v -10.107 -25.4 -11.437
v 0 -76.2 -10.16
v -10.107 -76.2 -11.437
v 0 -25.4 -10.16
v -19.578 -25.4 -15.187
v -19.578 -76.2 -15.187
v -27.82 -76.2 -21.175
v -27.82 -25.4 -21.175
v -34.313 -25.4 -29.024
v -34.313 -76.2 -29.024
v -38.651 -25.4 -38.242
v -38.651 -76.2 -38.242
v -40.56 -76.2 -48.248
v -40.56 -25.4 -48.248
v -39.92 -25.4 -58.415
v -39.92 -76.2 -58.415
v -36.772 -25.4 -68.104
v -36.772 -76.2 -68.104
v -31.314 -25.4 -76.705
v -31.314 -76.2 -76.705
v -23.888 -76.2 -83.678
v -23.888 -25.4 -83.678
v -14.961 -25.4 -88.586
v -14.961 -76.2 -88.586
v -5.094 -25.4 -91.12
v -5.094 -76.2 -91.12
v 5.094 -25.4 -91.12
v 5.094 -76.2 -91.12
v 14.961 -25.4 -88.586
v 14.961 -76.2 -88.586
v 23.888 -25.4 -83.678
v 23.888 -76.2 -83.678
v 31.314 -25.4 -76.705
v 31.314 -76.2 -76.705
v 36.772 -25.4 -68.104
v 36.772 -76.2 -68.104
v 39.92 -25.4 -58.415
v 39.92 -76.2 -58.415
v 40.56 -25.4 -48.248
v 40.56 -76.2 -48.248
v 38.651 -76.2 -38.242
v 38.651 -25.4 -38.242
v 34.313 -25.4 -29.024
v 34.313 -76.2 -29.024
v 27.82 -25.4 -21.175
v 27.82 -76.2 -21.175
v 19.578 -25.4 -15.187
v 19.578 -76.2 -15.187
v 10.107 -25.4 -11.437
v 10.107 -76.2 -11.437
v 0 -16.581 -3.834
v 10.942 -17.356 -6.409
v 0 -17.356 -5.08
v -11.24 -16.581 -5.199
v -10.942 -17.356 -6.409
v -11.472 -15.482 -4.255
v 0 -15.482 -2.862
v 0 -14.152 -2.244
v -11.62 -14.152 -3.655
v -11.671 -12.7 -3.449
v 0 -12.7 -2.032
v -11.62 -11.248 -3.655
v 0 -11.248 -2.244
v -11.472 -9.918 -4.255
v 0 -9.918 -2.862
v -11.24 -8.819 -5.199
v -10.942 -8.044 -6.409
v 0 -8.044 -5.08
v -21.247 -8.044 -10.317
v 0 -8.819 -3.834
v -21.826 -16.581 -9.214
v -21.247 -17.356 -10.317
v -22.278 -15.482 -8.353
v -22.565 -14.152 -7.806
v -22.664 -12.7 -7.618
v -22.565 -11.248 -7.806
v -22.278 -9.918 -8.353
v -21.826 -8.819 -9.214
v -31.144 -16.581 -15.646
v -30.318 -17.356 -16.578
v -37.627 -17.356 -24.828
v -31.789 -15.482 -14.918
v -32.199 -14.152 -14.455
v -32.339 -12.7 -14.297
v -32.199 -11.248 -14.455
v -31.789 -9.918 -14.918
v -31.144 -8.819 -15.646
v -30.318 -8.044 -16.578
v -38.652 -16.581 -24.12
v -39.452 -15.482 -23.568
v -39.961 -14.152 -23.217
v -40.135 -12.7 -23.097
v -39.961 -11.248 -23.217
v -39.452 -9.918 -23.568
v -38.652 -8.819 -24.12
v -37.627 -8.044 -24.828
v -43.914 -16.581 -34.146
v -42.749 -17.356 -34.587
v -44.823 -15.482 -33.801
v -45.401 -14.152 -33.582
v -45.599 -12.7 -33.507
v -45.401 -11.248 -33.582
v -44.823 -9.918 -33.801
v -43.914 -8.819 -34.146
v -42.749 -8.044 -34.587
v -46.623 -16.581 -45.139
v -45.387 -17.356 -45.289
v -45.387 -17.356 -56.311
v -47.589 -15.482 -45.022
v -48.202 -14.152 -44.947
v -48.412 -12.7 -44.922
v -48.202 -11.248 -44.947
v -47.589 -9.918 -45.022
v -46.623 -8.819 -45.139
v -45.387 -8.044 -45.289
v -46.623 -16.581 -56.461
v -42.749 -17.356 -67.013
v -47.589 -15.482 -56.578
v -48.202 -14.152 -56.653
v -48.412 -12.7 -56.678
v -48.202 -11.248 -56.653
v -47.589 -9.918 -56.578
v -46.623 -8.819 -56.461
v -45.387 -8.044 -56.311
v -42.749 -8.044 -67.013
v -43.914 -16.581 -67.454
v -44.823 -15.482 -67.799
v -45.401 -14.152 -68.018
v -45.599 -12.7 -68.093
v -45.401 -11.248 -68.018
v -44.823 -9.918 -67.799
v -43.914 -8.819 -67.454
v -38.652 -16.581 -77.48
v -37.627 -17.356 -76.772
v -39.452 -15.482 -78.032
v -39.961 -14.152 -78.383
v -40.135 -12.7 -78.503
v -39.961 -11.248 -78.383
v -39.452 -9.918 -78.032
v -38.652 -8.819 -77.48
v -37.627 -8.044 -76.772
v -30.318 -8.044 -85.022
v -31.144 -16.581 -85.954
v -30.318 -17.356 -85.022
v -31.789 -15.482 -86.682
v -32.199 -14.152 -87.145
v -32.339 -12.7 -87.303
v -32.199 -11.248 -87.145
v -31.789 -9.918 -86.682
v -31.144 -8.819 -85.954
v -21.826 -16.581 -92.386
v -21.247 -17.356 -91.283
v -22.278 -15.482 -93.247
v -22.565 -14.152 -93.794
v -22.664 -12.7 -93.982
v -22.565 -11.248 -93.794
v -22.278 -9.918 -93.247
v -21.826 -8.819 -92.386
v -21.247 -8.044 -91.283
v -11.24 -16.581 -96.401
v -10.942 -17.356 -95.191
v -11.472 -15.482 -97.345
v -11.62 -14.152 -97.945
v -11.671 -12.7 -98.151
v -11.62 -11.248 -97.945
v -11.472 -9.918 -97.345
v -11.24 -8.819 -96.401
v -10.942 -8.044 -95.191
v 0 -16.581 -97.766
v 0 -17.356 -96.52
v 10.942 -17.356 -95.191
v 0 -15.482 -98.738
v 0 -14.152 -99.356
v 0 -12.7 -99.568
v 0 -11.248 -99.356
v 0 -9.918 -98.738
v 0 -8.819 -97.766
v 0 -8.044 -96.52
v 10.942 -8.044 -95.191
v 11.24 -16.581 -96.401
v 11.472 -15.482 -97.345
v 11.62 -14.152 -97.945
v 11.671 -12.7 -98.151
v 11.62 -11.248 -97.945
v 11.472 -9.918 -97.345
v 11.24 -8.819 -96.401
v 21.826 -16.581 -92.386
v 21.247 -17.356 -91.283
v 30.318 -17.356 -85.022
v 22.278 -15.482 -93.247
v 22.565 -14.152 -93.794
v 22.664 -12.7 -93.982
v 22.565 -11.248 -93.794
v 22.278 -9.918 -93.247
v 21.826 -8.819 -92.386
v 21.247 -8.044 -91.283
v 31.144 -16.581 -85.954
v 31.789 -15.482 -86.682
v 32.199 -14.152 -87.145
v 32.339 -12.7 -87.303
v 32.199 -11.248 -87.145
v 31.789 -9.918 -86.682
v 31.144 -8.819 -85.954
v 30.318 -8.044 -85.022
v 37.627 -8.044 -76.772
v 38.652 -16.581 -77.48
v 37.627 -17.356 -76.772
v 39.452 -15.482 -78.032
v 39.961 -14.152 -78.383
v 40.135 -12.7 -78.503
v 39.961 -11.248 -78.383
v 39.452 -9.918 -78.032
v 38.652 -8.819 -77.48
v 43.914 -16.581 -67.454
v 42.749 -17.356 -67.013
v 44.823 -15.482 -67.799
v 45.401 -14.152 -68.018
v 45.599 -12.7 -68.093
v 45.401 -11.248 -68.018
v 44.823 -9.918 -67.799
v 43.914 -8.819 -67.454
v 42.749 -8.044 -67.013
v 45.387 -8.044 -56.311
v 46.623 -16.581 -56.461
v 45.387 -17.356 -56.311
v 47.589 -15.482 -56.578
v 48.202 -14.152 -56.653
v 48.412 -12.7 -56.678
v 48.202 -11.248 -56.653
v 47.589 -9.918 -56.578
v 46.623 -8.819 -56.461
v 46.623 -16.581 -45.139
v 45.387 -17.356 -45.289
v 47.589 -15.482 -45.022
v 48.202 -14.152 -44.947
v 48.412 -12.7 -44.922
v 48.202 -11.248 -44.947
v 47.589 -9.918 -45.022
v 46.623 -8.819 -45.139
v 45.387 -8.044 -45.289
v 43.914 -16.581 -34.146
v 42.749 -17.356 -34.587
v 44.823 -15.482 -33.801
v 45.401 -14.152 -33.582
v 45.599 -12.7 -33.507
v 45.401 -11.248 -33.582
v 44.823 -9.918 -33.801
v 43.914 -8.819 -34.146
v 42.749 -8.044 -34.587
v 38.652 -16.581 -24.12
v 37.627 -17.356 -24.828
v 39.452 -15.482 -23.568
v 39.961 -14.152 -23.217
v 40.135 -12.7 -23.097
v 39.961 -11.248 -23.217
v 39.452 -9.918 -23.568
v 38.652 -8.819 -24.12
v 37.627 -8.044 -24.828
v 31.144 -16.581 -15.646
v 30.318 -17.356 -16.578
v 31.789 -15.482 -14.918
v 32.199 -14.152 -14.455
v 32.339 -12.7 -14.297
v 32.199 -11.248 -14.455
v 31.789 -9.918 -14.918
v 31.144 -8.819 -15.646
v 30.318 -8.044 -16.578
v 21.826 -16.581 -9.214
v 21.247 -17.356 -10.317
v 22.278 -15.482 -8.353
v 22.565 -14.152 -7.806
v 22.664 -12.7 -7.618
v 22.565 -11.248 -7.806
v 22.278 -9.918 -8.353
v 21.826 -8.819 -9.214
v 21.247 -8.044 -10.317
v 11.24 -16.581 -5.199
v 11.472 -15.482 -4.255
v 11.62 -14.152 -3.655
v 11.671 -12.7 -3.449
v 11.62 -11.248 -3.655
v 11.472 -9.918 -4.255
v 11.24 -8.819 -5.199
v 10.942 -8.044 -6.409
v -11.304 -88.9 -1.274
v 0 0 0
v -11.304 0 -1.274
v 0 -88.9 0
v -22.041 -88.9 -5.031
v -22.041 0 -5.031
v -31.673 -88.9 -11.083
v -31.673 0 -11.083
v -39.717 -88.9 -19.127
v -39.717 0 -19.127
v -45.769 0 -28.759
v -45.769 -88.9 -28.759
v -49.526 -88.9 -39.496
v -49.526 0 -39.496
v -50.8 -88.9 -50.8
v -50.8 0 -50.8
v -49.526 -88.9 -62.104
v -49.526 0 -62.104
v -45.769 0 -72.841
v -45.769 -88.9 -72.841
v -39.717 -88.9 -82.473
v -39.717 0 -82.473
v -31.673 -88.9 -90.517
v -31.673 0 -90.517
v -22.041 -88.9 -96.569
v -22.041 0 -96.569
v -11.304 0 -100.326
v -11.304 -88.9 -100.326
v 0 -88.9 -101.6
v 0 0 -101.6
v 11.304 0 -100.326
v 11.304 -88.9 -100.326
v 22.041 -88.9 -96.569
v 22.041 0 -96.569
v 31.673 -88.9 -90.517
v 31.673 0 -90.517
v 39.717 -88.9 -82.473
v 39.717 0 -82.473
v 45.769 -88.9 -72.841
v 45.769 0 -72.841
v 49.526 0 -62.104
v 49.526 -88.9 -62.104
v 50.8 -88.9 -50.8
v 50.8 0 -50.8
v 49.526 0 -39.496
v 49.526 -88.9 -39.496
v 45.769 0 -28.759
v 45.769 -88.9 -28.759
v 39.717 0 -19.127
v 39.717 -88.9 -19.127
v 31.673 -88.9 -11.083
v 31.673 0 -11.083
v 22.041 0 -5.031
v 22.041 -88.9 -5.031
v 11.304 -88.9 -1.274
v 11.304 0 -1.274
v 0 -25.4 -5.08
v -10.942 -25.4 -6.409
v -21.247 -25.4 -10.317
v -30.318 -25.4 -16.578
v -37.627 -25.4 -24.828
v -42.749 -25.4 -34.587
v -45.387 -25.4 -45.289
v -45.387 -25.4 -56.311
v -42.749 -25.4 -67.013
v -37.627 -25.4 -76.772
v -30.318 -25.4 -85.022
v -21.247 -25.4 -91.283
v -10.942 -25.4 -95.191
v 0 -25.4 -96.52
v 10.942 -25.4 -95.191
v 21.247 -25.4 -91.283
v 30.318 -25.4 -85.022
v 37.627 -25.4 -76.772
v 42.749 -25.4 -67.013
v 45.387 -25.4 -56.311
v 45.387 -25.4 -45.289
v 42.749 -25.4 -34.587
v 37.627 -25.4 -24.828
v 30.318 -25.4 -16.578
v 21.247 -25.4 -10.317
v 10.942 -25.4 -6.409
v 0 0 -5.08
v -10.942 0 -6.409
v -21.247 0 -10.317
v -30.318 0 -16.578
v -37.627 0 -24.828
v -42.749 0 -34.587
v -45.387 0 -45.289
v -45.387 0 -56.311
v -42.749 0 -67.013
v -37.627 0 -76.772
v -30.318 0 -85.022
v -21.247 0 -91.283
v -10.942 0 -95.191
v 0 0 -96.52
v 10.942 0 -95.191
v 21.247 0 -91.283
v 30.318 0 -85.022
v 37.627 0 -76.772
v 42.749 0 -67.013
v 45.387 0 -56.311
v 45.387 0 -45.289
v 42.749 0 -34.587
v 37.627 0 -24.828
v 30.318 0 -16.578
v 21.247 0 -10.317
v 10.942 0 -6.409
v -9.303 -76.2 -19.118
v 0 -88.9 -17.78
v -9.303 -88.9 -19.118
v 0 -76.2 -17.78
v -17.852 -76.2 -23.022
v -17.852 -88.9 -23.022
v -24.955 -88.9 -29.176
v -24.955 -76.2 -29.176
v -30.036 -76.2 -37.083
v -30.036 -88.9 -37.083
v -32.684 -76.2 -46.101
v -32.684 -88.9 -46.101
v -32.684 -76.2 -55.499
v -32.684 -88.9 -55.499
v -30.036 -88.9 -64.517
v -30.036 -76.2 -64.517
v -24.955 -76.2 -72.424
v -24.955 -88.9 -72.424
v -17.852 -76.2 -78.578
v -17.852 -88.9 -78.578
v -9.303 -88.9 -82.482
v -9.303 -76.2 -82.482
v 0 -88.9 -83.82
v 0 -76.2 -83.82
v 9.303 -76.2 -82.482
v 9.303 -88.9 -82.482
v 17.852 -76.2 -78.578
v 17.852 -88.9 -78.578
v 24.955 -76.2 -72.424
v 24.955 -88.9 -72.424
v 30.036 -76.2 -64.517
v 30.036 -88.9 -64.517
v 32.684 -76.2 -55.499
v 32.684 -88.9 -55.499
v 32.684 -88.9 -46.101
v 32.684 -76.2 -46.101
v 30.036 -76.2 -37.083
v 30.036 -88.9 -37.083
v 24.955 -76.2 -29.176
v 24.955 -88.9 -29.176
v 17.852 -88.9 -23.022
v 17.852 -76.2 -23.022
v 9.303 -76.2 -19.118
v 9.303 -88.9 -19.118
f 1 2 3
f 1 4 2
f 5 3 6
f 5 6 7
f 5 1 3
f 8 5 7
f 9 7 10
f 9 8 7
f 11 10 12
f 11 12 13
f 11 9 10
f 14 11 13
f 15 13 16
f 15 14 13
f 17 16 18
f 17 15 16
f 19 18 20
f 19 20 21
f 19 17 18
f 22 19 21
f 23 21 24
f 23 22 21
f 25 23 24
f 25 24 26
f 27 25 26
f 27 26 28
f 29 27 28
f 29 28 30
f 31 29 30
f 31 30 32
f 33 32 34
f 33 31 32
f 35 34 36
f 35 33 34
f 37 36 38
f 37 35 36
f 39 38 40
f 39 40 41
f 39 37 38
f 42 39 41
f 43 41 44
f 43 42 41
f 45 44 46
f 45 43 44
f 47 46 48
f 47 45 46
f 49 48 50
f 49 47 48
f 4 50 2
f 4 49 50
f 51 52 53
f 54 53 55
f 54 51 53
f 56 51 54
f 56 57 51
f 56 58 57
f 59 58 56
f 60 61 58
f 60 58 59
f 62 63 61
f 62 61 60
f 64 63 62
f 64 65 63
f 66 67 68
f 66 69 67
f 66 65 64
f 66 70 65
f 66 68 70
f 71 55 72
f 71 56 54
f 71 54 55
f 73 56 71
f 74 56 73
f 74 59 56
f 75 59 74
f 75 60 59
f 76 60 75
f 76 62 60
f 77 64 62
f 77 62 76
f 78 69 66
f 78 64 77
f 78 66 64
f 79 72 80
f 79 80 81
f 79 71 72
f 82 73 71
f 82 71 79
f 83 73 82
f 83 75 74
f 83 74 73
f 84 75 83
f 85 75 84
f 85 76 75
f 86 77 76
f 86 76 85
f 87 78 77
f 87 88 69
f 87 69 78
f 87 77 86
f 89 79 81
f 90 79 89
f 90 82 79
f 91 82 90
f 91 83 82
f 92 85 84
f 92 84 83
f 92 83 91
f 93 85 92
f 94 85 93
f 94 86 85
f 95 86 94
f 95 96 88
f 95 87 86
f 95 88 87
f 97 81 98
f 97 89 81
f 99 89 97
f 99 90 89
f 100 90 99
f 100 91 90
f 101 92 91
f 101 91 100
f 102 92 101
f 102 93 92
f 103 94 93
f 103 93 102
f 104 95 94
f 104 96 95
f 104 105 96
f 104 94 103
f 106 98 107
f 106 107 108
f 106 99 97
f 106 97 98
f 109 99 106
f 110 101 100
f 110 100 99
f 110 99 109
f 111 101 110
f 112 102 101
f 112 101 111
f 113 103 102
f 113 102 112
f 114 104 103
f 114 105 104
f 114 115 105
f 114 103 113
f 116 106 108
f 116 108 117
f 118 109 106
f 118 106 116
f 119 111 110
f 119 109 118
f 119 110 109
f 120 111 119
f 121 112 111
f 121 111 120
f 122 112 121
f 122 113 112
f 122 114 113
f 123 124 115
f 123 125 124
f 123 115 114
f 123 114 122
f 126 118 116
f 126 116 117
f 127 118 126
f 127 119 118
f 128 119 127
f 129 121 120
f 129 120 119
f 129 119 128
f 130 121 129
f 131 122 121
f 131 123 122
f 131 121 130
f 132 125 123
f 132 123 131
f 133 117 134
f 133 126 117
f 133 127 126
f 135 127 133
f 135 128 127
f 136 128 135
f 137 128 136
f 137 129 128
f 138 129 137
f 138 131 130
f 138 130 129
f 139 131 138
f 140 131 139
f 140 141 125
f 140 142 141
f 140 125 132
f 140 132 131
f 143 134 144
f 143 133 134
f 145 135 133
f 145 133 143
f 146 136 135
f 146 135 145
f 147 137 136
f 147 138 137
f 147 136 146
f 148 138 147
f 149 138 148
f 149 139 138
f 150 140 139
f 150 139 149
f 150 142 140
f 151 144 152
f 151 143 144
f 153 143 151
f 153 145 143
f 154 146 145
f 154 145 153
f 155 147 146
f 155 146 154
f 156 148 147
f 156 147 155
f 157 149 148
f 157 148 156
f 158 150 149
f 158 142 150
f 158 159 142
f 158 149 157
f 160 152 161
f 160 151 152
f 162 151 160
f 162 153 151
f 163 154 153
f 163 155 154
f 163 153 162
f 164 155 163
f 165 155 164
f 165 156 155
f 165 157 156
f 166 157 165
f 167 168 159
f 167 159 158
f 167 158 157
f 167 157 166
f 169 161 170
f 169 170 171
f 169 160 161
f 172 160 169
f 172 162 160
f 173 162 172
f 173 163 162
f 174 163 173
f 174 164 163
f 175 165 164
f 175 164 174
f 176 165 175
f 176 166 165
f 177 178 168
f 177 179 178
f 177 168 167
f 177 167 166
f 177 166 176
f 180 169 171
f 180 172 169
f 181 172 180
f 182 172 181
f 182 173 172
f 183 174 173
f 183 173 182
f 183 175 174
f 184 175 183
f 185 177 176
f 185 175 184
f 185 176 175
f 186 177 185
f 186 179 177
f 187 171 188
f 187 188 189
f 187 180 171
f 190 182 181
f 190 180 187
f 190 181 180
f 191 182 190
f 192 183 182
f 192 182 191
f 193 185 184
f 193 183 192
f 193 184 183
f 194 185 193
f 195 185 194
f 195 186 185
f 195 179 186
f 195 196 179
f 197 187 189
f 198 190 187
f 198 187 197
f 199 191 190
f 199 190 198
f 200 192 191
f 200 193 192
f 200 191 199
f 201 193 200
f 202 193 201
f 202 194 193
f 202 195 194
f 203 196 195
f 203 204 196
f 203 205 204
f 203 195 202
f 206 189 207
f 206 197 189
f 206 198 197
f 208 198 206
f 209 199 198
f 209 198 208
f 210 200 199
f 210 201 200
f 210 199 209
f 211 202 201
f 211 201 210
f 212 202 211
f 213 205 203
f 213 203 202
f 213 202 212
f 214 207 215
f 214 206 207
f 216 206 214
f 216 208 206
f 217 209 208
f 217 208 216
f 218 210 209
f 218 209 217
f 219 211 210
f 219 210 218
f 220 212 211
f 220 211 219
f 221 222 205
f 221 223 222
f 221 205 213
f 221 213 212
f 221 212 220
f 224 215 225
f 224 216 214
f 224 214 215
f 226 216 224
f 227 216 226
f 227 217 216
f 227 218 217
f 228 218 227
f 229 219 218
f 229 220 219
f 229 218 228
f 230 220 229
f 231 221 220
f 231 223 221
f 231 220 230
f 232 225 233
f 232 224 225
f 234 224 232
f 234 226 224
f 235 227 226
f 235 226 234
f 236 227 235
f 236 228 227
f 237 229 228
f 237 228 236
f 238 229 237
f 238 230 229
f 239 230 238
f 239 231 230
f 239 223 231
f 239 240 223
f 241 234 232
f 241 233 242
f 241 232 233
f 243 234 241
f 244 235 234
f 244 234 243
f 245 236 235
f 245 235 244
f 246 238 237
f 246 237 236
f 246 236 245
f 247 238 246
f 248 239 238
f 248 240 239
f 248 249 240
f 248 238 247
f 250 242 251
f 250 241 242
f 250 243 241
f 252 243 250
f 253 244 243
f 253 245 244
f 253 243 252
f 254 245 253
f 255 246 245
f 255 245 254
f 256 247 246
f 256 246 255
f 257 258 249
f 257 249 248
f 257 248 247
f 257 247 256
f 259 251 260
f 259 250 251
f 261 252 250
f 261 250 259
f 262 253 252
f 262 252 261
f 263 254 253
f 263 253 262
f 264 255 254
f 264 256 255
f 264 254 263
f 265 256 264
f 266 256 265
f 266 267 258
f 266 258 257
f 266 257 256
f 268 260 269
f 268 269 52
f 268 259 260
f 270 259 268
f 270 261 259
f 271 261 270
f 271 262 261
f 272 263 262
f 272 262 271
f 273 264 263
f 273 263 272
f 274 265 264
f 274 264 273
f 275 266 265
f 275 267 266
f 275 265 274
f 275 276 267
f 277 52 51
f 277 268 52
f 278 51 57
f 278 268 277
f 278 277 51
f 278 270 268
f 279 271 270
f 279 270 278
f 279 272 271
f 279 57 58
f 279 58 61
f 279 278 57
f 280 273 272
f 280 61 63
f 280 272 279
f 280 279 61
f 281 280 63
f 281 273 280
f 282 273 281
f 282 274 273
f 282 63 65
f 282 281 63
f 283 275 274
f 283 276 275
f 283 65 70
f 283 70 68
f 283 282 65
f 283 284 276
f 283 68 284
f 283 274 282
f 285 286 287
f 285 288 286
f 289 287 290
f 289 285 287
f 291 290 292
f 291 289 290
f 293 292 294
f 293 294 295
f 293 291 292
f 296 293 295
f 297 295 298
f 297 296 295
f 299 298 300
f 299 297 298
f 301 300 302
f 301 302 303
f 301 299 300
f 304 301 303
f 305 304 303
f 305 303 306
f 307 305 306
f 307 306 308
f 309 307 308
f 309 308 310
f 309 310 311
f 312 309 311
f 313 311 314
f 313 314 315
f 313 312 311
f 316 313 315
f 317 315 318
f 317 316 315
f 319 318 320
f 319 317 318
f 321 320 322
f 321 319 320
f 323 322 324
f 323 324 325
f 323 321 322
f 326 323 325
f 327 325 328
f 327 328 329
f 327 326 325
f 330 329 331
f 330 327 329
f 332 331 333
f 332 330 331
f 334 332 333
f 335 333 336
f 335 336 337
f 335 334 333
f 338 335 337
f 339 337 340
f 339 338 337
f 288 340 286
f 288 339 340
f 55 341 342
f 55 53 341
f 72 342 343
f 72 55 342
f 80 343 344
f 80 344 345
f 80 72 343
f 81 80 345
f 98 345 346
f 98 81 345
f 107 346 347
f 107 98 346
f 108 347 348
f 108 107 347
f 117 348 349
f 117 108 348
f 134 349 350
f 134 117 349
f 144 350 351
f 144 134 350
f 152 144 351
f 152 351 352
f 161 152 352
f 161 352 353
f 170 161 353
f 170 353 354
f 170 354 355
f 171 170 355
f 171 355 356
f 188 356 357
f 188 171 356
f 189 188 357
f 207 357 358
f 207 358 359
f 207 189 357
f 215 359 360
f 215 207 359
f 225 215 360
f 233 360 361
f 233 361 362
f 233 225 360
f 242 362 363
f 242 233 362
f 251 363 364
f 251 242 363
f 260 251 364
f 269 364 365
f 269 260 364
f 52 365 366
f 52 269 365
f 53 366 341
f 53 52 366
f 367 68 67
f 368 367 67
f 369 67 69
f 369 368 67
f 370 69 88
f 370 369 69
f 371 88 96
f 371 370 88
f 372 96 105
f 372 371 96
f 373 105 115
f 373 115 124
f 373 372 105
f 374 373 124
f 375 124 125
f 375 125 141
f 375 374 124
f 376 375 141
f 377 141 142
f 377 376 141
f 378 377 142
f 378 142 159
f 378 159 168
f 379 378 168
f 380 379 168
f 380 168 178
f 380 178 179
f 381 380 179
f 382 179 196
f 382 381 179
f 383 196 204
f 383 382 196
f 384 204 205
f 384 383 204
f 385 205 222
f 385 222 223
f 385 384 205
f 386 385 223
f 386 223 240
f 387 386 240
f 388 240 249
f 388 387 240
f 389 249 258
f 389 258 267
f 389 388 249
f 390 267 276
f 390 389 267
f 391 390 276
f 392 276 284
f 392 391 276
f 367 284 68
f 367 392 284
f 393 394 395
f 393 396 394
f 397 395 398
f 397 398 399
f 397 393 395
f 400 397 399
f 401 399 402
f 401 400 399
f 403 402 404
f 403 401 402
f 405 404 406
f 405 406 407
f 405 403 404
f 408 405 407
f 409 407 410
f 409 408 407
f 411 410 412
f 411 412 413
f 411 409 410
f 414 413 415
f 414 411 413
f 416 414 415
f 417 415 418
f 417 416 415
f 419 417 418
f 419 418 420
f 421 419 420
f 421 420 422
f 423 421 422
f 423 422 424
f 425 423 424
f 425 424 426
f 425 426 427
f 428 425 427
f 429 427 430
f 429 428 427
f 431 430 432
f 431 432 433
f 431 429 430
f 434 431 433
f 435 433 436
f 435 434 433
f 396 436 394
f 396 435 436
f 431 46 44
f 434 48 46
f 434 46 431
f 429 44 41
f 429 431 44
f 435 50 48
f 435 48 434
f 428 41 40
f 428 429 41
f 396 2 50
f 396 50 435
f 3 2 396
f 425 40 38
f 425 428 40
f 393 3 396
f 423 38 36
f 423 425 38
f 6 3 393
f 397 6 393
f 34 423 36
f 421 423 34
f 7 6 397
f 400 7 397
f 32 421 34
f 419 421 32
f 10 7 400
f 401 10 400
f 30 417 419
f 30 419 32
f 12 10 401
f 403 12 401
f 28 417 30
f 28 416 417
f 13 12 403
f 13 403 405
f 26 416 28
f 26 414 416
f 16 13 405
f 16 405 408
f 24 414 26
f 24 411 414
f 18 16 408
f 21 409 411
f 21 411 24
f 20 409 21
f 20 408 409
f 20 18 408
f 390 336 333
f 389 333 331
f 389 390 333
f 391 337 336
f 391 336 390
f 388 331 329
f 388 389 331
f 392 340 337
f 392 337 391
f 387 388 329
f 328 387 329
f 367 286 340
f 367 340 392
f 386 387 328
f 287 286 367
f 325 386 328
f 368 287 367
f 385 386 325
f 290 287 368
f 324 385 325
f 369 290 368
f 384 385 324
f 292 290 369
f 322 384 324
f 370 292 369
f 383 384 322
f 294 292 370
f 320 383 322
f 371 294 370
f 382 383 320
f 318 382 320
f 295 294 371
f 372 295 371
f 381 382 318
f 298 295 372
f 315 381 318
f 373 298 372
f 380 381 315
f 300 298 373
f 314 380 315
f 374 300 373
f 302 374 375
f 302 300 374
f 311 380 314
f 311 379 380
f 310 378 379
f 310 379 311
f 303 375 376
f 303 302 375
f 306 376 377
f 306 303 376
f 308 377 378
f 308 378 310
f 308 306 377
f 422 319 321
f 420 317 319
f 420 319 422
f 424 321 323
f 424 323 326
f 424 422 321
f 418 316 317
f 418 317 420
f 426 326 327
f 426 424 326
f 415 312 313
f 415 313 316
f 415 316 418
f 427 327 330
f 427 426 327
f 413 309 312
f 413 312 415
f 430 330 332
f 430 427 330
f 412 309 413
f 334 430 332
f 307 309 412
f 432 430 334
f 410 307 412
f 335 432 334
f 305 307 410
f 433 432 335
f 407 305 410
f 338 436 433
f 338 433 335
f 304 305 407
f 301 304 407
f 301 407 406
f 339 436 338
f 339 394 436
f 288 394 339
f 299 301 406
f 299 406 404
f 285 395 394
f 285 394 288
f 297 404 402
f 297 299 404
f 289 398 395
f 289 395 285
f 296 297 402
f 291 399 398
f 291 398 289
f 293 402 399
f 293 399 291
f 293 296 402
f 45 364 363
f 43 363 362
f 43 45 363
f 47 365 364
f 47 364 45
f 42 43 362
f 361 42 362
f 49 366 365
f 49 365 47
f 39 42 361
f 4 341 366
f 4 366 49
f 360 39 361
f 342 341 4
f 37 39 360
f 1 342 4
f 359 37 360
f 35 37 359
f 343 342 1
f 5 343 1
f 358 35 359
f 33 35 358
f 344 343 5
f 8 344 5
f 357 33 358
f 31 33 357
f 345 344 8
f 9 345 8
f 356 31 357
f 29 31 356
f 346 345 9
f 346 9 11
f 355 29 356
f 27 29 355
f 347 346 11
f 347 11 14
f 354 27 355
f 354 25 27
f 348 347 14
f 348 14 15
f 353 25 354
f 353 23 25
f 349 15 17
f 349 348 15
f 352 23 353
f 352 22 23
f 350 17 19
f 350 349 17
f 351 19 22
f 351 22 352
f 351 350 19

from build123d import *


with BuildPart() as part:
    # Sketch1 → Revolve1 (revolve)
    with BuildSketch(Plane(origin=(0, 0, 0), x_dir=(0, 0, -1), z_dir=(1, 0, 0))):
        with BuildLine():
            Line((0, 0), (0, -88.9))
            Line((0, -88.9), (10.16, -88.9))
            Line((10.16, -88.9), (17.78, -88.9))
            Line((17.78, -88.9), (17.78, -76.2))
            Line((17.78, -76.2), (10.16, -76.2))
            Line((10.16, -76.2), (10.16, -25.4))
            Line((10.16, -25.4), (5.08, -25.4))
            Line((5.08, -25.4), (5.08, -17.355896906))
            ThreePointArc((5.08, -17.355896906), (2.032, -12.7), (5.08, -8.044103094))
            Line((5.08, -8.044103094), (5.08, 0))
            Line((5.08, 0), (0, 0))
        make_face()
    revolve(axis=Axis((0, -28.313229254, -50.8), (0, -1, 0)))


solid = part.part
